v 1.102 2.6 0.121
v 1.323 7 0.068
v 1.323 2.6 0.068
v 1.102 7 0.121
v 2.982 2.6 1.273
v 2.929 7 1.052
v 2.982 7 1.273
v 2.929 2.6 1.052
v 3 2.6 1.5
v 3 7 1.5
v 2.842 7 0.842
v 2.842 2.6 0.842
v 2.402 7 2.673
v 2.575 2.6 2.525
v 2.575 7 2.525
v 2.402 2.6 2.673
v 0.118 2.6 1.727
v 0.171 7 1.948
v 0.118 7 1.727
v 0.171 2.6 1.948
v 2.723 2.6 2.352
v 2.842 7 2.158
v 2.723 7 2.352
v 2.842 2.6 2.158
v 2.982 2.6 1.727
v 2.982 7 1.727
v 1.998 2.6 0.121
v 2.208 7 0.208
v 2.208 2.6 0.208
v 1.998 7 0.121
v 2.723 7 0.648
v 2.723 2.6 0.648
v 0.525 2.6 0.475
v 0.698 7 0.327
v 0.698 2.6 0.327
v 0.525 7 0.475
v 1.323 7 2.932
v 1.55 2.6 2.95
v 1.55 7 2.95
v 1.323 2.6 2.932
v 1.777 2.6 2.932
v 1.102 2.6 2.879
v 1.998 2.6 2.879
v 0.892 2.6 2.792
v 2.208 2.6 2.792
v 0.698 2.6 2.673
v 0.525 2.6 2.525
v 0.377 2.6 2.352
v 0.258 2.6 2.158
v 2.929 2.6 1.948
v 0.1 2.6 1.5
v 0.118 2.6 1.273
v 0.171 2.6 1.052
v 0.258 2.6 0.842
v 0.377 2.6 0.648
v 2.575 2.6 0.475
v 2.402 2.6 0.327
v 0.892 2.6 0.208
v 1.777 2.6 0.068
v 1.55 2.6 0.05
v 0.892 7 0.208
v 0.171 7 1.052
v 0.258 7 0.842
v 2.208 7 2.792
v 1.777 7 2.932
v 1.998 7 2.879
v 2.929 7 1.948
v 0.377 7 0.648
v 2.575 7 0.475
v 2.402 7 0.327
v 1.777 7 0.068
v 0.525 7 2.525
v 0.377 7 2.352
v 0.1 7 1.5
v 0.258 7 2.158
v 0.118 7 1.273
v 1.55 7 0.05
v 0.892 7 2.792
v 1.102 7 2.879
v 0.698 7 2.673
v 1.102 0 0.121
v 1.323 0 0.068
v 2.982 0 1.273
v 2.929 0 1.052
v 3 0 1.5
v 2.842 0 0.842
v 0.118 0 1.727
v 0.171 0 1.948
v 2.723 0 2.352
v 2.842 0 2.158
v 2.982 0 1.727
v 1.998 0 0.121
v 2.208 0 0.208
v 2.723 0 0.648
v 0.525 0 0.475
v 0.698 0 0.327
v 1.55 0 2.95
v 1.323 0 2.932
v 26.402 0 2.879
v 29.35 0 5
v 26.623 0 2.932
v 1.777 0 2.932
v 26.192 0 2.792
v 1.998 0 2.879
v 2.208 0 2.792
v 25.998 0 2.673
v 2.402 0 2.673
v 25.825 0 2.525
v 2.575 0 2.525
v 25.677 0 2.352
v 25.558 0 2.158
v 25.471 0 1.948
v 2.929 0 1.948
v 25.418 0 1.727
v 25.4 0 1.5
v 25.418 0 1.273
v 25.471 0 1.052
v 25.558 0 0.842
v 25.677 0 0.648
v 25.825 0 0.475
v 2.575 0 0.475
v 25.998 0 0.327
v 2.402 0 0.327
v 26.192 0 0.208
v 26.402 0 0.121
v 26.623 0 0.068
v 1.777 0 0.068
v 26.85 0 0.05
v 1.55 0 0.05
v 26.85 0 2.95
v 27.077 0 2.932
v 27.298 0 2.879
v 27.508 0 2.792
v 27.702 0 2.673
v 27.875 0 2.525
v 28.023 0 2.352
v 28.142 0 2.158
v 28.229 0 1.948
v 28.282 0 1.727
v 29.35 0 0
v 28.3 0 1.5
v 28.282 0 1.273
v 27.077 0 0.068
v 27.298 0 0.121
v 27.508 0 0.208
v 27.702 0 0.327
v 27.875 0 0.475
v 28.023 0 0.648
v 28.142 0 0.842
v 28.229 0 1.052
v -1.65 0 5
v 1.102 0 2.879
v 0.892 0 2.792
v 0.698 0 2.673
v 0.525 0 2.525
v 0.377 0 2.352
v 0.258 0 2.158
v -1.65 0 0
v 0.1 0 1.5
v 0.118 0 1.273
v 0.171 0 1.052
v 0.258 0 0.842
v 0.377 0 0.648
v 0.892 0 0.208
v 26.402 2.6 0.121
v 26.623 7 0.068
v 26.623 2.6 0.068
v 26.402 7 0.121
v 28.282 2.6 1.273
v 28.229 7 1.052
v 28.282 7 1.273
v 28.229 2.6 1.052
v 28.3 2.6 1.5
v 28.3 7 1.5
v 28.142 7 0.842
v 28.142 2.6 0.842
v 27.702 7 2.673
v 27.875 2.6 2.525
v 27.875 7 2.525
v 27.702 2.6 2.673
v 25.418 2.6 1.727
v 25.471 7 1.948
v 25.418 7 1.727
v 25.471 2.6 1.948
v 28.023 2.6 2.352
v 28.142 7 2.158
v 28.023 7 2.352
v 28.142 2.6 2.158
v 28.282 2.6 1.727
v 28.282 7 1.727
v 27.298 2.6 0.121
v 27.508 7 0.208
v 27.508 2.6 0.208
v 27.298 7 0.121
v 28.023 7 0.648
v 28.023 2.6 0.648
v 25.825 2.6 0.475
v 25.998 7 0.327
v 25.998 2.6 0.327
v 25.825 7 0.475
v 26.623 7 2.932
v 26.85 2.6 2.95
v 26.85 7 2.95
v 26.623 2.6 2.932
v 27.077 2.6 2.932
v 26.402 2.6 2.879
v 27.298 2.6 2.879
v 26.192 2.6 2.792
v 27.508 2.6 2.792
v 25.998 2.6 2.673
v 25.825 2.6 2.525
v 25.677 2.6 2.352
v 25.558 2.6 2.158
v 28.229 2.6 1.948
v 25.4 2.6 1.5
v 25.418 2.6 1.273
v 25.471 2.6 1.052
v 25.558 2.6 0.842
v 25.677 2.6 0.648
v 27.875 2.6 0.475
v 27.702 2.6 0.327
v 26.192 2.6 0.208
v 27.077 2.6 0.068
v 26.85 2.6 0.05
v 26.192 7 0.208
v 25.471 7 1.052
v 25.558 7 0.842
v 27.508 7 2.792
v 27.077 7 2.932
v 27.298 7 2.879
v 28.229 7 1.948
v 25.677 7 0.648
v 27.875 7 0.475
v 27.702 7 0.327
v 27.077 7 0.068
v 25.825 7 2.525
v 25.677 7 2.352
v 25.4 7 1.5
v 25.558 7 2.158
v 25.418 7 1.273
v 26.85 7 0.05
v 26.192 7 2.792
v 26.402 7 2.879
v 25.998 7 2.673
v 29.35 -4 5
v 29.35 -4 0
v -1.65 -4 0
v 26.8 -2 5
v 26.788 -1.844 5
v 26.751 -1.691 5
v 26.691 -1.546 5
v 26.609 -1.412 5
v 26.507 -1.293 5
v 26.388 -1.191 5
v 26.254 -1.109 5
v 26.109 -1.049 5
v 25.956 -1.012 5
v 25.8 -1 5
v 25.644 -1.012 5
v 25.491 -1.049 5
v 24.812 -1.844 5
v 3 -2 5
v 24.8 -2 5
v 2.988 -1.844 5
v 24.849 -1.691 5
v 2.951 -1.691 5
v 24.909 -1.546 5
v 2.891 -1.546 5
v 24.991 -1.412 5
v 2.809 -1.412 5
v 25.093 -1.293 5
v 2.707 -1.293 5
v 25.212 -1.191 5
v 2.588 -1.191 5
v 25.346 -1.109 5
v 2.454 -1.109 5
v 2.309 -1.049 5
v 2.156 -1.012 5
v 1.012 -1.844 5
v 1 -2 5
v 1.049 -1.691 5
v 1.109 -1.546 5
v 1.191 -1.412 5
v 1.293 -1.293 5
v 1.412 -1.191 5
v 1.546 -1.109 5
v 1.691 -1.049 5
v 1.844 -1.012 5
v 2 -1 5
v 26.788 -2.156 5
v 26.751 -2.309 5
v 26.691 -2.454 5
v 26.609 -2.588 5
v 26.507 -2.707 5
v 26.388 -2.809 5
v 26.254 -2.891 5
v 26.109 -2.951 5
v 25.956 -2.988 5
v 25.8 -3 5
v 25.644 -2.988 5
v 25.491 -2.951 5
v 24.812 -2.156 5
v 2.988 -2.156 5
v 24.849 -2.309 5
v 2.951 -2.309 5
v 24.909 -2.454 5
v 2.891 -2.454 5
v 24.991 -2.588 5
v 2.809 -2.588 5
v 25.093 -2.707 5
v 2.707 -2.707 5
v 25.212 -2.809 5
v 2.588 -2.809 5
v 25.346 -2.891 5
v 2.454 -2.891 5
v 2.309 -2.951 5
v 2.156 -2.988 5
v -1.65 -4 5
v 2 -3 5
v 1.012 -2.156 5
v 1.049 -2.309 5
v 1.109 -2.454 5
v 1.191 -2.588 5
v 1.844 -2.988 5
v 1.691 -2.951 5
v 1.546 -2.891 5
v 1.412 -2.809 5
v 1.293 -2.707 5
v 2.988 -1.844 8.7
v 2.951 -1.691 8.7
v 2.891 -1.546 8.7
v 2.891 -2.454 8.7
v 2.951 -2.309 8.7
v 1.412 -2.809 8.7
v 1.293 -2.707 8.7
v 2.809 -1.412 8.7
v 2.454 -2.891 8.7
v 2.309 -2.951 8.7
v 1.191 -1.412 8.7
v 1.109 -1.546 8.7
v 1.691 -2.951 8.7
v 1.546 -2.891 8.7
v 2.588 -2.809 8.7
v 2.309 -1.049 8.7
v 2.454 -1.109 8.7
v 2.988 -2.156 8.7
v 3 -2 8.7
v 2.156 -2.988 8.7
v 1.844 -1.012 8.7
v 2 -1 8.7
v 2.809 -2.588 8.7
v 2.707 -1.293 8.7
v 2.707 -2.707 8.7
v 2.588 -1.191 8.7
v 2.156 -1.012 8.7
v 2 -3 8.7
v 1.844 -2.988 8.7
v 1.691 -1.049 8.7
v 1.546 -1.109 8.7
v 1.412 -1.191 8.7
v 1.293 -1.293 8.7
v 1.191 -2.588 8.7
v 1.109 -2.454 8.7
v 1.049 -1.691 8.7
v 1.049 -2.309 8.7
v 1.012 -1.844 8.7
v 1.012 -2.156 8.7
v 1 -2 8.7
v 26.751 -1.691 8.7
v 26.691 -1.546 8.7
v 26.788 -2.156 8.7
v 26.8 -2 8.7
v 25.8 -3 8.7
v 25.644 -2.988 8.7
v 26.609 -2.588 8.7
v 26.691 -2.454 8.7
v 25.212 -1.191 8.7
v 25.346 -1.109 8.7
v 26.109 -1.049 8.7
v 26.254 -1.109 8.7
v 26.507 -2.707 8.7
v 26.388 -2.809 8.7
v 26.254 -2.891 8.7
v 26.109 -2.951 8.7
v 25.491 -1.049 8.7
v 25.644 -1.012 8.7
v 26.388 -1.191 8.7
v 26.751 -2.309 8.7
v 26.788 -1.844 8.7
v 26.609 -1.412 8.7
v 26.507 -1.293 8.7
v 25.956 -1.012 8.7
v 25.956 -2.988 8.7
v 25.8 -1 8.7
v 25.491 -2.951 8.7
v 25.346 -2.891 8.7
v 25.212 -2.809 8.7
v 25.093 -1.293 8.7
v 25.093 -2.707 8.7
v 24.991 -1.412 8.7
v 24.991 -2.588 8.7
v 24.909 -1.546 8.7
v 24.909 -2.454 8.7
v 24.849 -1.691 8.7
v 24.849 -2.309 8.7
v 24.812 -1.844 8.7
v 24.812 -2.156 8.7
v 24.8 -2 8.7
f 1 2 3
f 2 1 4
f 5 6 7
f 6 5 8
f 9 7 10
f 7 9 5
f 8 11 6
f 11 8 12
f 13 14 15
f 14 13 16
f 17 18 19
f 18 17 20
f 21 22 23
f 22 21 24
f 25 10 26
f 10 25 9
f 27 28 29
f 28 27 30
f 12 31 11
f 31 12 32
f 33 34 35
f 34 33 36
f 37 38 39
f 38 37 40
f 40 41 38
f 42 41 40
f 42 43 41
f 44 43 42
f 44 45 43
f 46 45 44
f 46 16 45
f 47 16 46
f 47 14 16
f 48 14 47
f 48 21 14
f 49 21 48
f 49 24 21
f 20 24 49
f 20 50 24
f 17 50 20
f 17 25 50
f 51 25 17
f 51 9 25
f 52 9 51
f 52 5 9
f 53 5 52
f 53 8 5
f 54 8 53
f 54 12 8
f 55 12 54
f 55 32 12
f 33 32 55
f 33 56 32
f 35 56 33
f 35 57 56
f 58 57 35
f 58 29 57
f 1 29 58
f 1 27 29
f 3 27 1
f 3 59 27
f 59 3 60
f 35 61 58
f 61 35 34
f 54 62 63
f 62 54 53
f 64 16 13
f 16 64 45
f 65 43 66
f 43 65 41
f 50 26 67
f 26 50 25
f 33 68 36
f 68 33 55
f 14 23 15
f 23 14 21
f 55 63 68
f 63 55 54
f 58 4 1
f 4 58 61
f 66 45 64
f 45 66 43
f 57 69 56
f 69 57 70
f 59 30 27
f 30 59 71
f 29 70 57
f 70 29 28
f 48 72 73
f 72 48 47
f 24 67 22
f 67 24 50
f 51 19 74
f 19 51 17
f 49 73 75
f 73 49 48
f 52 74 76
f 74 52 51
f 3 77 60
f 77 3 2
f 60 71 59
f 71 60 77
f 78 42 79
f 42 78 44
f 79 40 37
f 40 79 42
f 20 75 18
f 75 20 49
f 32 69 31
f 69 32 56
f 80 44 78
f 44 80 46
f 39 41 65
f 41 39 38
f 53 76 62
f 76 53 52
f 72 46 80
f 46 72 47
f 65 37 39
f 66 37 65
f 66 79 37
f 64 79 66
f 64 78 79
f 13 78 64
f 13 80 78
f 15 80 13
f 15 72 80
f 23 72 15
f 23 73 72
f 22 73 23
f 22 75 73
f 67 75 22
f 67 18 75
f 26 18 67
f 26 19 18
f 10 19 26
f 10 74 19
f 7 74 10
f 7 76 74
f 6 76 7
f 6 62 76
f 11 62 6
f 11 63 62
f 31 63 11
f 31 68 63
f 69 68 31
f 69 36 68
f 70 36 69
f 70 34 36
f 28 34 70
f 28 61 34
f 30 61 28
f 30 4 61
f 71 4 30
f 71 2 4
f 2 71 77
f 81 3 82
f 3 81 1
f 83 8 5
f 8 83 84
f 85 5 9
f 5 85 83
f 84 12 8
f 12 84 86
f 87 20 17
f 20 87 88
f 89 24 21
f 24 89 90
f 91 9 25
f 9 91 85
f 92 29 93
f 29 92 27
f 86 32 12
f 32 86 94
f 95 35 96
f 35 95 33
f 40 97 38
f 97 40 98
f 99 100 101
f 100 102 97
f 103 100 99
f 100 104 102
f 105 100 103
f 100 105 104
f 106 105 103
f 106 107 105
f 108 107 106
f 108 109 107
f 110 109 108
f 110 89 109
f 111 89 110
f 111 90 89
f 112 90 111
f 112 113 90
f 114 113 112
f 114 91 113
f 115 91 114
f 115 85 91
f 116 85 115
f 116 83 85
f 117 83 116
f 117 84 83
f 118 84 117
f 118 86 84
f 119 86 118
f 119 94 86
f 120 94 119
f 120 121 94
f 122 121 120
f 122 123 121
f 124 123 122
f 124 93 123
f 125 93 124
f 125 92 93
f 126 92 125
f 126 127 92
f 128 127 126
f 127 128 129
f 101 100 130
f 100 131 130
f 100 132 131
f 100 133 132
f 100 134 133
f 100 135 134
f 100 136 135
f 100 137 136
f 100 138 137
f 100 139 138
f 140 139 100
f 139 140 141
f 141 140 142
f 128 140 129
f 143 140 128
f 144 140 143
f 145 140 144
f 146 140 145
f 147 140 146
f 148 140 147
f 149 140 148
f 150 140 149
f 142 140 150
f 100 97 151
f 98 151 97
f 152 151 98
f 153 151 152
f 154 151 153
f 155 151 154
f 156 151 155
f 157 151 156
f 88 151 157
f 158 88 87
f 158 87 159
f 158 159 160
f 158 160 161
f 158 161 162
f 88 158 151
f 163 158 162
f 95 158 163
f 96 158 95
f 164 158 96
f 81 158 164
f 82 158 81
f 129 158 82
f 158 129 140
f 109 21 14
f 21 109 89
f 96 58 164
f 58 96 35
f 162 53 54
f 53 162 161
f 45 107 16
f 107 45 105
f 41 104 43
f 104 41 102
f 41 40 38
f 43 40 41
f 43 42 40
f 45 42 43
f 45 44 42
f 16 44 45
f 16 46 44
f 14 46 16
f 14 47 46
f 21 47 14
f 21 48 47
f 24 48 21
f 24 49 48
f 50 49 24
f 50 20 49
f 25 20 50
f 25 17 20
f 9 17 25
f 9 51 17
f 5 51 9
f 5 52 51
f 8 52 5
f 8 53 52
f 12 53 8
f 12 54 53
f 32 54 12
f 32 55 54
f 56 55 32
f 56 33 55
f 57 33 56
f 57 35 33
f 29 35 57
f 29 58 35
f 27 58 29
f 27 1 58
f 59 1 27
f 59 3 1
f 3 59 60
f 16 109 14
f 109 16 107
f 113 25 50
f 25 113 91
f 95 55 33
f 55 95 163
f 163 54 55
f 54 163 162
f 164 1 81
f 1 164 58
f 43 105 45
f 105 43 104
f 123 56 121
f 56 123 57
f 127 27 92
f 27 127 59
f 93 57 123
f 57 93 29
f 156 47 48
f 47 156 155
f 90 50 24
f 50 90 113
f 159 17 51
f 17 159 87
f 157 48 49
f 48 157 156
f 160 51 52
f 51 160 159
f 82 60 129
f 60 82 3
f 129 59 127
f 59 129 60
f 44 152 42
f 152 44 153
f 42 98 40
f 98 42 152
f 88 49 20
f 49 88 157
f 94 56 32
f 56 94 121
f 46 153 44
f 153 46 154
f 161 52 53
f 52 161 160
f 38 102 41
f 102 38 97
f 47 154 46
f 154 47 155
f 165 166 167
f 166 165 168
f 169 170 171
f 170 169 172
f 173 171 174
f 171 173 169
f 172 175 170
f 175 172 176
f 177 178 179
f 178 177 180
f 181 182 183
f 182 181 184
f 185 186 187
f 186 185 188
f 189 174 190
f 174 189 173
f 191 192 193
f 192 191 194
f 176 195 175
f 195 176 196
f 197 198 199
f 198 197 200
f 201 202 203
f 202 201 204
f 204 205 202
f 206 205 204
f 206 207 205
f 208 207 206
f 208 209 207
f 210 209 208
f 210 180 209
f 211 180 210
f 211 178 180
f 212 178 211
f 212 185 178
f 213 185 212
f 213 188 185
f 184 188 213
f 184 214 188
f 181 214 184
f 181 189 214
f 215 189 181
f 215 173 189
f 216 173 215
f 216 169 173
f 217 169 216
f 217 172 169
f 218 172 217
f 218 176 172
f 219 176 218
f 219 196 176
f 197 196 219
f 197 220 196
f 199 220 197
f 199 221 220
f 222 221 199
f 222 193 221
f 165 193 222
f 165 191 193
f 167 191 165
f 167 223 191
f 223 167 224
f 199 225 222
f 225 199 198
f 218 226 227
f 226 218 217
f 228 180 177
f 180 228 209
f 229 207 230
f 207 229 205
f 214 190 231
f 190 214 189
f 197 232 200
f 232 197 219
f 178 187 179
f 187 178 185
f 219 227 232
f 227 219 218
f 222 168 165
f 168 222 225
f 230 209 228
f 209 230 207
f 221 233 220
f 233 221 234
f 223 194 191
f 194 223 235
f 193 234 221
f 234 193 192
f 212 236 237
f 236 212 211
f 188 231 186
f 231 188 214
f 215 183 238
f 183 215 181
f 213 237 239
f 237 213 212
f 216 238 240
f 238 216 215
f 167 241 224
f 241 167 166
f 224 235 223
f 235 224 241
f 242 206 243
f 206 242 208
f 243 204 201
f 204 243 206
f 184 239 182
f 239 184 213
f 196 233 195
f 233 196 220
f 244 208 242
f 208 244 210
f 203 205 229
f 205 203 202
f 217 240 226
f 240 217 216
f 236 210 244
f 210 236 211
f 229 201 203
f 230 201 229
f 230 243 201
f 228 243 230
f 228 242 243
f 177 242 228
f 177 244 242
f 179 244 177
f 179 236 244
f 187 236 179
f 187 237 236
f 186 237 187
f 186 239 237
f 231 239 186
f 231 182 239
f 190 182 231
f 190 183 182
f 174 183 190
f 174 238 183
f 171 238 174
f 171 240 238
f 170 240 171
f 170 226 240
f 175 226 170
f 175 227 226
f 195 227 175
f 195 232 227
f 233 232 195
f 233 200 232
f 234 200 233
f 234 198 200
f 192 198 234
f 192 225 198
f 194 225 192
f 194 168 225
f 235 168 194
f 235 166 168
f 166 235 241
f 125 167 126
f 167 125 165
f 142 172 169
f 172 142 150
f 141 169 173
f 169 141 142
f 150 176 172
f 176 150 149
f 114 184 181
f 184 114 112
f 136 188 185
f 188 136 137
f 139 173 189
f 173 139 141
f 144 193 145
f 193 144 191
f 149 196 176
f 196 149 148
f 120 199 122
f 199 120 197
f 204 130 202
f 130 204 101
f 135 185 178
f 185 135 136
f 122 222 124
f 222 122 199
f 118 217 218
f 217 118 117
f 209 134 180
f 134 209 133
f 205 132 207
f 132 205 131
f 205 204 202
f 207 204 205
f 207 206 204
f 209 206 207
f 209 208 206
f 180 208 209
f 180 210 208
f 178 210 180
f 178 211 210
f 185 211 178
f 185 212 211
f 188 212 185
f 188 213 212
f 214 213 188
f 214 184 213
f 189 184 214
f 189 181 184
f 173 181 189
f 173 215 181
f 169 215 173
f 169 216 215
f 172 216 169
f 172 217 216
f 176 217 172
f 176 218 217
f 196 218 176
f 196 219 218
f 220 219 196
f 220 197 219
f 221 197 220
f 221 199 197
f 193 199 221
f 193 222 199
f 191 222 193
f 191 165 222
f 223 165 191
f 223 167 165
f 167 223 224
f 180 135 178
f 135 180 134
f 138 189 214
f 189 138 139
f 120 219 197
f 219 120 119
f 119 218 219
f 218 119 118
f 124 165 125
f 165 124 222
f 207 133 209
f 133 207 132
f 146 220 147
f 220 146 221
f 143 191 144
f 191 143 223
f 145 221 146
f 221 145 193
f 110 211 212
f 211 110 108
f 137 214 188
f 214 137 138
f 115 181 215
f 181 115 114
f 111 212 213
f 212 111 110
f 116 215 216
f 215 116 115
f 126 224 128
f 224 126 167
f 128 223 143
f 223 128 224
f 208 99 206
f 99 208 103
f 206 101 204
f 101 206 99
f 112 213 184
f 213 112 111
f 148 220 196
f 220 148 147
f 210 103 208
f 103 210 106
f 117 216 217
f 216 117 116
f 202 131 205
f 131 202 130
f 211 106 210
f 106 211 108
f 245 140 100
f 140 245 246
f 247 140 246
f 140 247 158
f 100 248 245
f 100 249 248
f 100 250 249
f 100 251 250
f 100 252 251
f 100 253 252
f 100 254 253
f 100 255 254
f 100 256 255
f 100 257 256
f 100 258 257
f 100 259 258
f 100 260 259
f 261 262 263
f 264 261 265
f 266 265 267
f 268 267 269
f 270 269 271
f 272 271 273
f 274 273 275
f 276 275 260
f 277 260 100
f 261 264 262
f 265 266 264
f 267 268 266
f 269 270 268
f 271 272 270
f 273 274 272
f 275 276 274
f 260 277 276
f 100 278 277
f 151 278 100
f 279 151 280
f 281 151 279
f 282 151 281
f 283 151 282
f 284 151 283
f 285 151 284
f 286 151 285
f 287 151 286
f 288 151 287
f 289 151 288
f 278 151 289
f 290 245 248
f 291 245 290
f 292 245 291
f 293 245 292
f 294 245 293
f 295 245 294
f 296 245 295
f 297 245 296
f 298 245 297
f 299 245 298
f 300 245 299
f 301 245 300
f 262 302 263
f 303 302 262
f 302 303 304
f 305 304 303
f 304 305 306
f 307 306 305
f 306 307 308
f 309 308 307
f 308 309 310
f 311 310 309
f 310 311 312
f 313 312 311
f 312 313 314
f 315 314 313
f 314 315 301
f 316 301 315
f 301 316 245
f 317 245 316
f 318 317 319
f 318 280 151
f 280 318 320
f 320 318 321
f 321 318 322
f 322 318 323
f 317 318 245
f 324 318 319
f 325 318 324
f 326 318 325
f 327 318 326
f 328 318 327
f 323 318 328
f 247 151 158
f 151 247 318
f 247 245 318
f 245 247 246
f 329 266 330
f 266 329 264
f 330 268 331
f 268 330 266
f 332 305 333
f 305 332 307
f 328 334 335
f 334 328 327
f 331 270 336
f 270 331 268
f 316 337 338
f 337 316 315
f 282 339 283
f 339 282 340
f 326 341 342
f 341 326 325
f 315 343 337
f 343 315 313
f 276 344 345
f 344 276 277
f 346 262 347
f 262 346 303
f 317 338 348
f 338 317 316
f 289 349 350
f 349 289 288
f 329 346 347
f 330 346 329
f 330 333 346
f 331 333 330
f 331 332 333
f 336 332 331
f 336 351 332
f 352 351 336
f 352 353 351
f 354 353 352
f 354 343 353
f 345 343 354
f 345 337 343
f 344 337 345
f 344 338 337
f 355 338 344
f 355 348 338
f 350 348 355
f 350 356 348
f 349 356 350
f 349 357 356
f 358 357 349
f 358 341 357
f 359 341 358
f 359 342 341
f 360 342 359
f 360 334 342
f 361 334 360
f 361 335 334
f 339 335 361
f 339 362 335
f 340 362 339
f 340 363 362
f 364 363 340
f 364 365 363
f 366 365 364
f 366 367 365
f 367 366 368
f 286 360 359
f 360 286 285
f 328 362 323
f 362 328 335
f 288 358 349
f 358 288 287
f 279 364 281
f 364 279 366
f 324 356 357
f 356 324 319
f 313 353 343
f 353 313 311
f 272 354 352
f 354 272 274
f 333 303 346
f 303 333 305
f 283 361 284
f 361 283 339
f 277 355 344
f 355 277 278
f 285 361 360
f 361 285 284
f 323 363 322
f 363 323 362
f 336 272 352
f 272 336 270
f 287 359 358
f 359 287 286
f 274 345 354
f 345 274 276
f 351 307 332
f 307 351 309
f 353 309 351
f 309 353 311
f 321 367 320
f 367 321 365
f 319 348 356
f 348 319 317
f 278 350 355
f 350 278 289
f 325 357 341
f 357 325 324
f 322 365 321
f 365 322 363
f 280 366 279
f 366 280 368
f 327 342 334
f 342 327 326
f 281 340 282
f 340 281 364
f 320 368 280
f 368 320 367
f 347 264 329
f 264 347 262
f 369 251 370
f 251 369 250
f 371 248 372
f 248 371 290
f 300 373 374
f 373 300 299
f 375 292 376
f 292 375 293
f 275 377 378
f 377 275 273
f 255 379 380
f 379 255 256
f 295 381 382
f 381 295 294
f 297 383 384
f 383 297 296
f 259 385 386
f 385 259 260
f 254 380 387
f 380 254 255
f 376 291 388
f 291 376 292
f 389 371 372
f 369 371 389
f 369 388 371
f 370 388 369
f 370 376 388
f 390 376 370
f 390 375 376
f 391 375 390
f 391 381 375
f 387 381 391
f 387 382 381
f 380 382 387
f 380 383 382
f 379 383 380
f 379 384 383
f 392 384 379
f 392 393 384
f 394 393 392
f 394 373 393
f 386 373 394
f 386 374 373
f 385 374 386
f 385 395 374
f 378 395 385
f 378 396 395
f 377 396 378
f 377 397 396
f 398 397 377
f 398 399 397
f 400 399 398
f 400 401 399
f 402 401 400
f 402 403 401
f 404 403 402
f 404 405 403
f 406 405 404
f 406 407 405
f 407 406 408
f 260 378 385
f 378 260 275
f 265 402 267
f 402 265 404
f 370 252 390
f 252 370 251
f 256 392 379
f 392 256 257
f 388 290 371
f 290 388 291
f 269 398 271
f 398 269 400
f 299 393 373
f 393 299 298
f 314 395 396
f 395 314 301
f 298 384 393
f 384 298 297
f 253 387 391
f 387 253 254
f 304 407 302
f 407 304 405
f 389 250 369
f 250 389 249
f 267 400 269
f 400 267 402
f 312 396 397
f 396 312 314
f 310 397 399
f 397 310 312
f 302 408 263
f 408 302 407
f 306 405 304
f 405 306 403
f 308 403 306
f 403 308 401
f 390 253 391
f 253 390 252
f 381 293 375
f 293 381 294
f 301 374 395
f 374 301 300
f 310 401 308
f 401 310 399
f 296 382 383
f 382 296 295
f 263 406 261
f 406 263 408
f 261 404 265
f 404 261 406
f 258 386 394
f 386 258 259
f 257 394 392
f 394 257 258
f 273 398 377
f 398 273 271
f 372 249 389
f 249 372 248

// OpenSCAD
$fn = 40;
board_height = 1.7;
board_width = 27.7;
hole_diameter = 2;
hole_big = 3;

size = [board_width, 4, 2];
top_bar = [31, size.y, hole_big + 2];
offset = [1, 1];

// 2 - board size
long_bolt_length = 2 + 10;
offset_big = [1.7, 1.3, ];

// latchalike?





module bolt(length = 3, diameter = 2.9) {
  d2 = diameter - 0.5;
  offset = 0.4;
  cylinder(h = length - offset, d = diameter);
  translate([0, 0, length])
  {
    translate([0, 0, -offset])
    cylinder(h = 2 + offset, d = diameter);
    
    translate([0, 0, 2])
    cylinder(h = 2, d = diameter);
  }
}

module holder(length = 3, diameter = 3) {
  d2 = diameter - 0.5;
translate([0,0,1]) {
translate([12.3,0,0])
cube([2, 1, 2], center = true);
translate([10, 0, 0])
difference() {
  cylinder(h = 2, d = diameter+2, center = true);
  cylinder(h = 10, d = d2, center = true);
  translate([-diameter, 0, 0])
  cylinder(h = 10, d = diameter*2, center=true, $fn=1);
}
}
}



// not requried, just for debug
//color("green", 0.4)
//translate([0, -3, 5])
//cube(size);

module pin(h = 1, hole_diameter=hole_diameter) {
  
translate([hole_diameter/2, hole_diameter/2, 0])
cylinder(h = h, d = hole_diameter);
}
pin_height = board_height + 2;
if (1) {
  translate([0, 0, 7])
  rotate([180, 0, 0])
  translate([0, 0, size.z]) {
    
  translate([offset.x, offset.y,0])
  mirror([0,0,1]) {
  //bolt(length = pin_height, diameter = hole_diameter);
  pin(h = pin_height);
  }
  translate([25-hole_diameter+0.8, 0, 0])
  translate([offset.x, offset.y,0])
  mirror([0,0,1]) {
  //bolt(length = pin_height, diameter = hole_diameter);
  pin(h = pin_height);
  }
  
  //translate([board_width - offset.x, offset.y, 0])
  //translate([-hole_diameter, 0, 0])
  //translate([offset.x, offset.y, 0])
  //mirror([0,0,1])
 // {
 // //bolt(length = pin_height, diameter = //hole_diameter);
  //    translate([-1, -1, 0])
  //pin(h = pin_height);
  //}
  // align
  translate([(size.x - top_bar.x)/2, 0, 0]) {
    color("yellow", 0.5)
    cube(top_bar);
    
    translate([0, 0, top_bar.z - hole_big]) {
    translate([offset_big.x,0, 0])
    rotate([90, 0, 0])
    translate([hole_big/2, hole_big/2, 0])
    bolt();
    
    translate([top_bar.x - hole_big - offset.x, 0, 0])
    rotate([90, 0, 0])
    translate([hole_big/2, hole_big/2, 0])
    bolt();
    }
  }
}
}

//translate([0, 10, 0])
//holder();
//translate([27, 10, 0])
//mirror([1, 0, 0])
//holder();

//translate([14, -4, 0])
//rotate([0, 0, 90])
//holder(diameter = hole_diameter);


//translate([14, 25, 0])
//rotate([0, 0, 270])
//holder(diameter = hole_diameter);
